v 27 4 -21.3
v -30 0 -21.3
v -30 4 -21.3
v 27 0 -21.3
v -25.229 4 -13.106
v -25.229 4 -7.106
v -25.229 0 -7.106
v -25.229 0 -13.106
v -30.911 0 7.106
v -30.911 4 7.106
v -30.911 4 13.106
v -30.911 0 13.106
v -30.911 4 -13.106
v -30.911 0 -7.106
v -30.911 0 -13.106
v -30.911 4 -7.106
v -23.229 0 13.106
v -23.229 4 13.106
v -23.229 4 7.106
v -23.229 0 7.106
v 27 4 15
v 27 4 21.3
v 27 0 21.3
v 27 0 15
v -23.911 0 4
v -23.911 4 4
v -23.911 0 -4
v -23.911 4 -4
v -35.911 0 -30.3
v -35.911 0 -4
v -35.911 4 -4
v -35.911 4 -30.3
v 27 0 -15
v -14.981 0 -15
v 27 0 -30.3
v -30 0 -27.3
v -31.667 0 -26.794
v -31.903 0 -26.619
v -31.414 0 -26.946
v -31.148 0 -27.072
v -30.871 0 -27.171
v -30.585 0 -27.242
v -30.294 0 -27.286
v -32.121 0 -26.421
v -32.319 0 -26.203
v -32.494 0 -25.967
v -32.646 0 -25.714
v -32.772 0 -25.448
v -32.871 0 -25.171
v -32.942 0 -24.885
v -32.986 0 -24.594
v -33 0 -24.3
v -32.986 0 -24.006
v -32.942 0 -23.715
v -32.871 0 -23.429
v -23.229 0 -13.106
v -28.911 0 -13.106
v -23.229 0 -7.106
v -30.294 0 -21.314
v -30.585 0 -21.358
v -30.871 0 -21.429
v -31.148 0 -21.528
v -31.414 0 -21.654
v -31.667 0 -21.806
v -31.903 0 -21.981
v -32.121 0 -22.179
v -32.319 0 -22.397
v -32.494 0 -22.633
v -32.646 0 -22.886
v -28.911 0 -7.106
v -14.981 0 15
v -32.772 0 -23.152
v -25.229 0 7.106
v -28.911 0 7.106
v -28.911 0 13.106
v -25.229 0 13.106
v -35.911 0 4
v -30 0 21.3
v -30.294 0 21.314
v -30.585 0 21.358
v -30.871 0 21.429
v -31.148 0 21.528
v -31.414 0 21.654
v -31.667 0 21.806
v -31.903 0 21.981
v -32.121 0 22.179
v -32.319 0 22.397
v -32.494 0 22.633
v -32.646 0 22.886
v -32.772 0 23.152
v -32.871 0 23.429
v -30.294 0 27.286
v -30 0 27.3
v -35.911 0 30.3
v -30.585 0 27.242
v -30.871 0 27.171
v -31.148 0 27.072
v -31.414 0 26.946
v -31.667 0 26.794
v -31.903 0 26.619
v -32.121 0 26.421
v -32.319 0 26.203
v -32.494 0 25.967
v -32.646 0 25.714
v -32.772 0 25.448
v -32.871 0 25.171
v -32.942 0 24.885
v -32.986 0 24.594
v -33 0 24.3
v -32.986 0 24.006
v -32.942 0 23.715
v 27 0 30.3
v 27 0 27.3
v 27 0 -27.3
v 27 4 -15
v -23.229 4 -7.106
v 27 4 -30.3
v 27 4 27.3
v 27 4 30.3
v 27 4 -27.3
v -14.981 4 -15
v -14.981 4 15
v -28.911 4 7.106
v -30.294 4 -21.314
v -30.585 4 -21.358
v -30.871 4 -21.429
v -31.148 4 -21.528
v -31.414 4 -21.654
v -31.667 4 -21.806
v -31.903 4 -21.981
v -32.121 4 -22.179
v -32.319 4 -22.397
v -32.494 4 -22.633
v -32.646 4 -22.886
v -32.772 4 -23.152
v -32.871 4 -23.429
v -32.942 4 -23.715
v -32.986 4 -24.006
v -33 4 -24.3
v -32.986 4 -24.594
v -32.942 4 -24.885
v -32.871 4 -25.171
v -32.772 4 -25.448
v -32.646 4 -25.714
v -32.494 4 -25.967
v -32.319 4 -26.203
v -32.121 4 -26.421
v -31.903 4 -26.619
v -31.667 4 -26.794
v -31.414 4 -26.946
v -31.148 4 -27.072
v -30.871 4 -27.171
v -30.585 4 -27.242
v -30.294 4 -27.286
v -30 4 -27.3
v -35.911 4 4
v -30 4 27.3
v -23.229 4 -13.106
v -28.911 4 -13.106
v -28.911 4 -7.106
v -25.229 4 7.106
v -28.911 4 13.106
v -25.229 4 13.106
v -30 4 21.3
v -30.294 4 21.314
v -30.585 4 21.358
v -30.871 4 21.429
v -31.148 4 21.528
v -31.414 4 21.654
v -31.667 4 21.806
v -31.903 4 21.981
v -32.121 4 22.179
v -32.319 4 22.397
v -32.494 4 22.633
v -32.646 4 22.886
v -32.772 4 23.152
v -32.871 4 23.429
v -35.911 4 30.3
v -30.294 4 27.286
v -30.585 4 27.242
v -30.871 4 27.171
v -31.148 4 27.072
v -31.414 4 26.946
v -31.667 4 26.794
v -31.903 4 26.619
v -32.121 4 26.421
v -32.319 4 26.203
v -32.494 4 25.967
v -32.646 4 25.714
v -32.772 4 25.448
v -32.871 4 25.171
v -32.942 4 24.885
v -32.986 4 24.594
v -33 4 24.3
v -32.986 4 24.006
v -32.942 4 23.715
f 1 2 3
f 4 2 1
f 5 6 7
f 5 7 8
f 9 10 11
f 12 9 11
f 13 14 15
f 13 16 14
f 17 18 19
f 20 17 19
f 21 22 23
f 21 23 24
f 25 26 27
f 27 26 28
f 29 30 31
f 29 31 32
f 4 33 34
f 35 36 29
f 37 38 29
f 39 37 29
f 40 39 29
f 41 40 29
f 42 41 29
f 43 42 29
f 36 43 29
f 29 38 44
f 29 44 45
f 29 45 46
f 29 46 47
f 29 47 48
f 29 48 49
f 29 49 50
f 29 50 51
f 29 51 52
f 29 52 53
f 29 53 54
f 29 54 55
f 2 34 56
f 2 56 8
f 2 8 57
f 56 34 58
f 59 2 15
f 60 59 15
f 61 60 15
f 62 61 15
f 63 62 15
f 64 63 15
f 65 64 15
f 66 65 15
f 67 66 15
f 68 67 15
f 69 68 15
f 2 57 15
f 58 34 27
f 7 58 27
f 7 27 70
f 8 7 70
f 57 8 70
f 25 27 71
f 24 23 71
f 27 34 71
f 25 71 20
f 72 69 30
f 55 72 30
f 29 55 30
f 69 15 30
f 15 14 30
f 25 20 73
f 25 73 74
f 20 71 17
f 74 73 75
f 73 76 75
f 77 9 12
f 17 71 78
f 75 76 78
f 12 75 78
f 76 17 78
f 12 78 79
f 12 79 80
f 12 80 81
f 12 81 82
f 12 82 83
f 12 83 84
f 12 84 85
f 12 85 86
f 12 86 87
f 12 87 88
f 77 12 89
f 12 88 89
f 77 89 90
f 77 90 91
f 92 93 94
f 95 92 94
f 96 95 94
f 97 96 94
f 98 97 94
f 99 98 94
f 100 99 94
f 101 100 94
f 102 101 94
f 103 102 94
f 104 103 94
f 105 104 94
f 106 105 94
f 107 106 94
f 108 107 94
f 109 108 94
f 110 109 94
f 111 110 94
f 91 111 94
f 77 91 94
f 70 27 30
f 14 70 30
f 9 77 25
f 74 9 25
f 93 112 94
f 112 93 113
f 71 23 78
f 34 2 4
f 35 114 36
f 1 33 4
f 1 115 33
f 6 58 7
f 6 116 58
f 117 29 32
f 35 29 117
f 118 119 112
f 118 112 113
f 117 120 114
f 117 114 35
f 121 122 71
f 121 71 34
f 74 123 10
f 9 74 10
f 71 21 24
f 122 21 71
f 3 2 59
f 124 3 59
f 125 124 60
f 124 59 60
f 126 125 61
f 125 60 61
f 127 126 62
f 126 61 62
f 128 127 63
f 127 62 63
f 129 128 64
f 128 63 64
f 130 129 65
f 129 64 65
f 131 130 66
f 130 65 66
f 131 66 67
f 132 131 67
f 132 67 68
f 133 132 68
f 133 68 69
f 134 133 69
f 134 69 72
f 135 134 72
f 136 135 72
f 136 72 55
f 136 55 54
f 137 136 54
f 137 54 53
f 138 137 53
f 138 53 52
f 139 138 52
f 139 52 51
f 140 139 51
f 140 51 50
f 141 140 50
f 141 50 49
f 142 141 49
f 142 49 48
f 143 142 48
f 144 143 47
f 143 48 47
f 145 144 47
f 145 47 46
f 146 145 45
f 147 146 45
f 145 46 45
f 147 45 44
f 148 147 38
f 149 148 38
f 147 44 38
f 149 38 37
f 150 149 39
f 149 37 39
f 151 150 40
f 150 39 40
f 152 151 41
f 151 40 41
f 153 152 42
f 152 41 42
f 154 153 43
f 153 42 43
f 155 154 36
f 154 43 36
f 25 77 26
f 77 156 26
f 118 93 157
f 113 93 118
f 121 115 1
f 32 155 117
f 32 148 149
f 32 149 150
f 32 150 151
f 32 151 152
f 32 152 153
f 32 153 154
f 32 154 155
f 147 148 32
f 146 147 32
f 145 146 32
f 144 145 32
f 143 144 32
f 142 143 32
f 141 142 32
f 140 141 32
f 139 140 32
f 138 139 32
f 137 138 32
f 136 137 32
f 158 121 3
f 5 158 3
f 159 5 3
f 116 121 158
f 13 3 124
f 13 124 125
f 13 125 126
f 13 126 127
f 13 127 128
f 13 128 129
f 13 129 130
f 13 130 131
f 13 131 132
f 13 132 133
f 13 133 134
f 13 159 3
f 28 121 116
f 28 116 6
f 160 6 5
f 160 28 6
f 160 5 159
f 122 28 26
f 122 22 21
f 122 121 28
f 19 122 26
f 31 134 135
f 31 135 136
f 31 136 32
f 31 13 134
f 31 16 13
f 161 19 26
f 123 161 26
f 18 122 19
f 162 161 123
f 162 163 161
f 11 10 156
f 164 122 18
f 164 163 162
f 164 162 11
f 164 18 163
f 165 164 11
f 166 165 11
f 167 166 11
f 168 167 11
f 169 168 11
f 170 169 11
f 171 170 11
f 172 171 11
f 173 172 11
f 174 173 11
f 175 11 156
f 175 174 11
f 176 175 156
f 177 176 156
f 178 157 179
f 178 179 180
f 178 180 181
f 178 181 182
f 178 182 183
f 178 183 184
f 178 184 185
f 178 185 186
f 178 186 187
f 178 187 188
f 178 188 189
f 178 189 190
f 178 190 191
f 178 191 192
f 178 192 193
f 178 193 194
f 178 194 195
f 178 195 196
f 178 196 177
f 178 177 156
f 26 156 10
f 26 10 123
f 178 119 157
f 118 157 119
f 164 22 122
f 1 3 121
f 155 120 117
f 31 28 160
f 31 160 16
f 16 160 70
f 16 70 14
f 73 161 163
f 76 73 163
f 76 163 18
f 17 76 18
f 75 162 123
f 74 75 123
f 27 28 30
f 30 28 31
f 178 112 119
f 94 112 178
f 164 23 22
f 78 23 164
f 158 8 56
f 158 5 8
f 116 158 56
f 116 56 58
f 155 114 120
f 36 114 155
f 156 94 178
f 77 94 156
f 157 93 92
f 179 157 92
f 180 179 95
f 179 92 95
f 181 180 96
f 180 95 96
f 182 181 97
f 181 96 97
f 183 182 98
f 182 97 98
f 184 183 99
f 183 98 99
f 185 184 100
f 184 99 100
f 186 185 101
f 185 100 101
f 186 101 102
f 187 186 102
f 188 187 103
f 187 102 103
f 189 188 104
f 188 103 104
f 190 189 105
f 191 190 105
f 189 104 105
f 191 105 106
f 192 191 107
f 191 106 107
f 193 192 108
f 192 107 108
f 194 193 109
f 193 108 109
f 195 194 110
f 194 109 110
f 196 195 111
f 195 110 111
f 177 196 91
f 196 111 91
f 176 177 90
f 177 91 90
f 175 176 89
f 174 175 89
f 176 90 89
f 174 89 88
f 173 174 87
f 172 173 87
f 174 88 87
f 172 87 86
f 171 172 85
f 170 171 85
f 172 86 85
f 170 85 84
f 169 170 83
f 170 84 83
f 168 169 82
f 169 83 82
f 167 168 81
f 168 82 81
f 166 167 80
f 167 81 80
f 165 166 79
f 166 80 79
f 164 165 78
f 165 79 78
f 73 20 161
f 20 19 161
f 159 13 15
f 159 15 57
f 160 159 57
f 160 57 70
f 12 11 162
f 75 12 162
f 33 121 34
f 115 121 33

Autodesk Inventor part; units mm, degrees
ref_plane "YZ Plane" through (0, 0, 0) normal (1, 0, 0) x (0, 1, 0)
ref_plane "XZ Plane" through (0, 0, 0) normal (0, 1, 0) x (-1, 0, 0)
ref_plane "XY Plane" through (0, 0, 0) normal (0, 0, 1) x (1, 0, 0)
sketch "Эскиз1" plane through (0, 0, 0) normal (0, 1, 0) x (-1, 0, 0)
  line L0 (0, 0) -> (0, 24.3)
  line L1 (0, 0) -> (0, -24.3)
  line L2 (-30, 24.3) -> (30, 24.3) construction
  line L3 (-30, 21.3) -> (30, 21.3)
  line L4 (30, 27.3) -> (-30, 27.3)
  arc A0 (-30, 27.3) -> (-30, 21.3) centre (-30, 24.3) ccw
  arc A1 (30, 21.3) -> (30, 27.3) centre (30, 24.3) ccw
  line L5 (-30, -24.3) -> (30, -24.3) construction
  line L6 (-30, -27.3) -> (30, -27.3)
  line L7 (30, -21.3) -> (-30, -21.3)
  arc A2 (-30, -21.3) -> (-30, -27.3) centre (-30, -24.3) ccw
  arc A3 (30, -27.3) -> (30, -21.3) centre (30, -24.3) ccw
  line L8 (-33, 24.3) -> (-33, 30.3)
  line L9 (-33, 30.3) -> (35.9111, 30.3)
  line L10 (35.9111, 30.3) -> (35.9111, -30.3)
  line L11 (35.9111, -30.3) -> (-33, -30.3)
  line L12 (-33, -30.3) -> (-33, 30.3)
  dimension "d0" = 24.3
  dimension "d1" = 24.3
  dimension "d2" = 30
  dimension "d3" = 6
  dimension "d4" = 6
  dimension "d5" = 6
  dimension "d6" = 6
extrude "Выдавливание1" add sketch "Эскиз1" along normal blind 4 contours L1 L7 A2 L12 A0 L3 L0 | L0 L3 A1 L4 A0 L8 L9 L10 L11 L12 A2 L6 A3 L7 L1
sketch "Эскиз2" plane through (0, 4, 0) normal (0, 1, 0) x (1, 0, 0)
  line L0 (33, 30.3) -> (-35.9111, 30.3) projected
  line L1 (33, -30.3) -> (27, -30.3)
  line L2 (27, -30.3) -> (27, 30.3)
  line L3 (27, 30.3) -> (33, 30.3)
  line L4 (33, 30.3) -> (33, -30.3)
  point P0 (0, 0)
  dimension "d9" = 6
extrude "Выдавливание2" cut sketch "Эскиз2" against normal through all
sketch "Эскиз3" plane through (0, 4, 0) normal (0, 1, 0) x (1, 0, 0)
  line L0 (27, 21.3) -> (27, -21.3) projected
  line L1 (27, 0) -> (27, -15)
  line L2 (27, -15) -> (27, 15)
  line L3 (27, -15) -> (-4.4812, -15)
  line L4 (-4.4812, -15) -> (-4.4812, 15)
  line L5 (-4.4812, 15) -> (27, 15)
  line L6 (27, 15) -> (27, -15)
  point P0 (0, 0)
  dimension "d12" = 15
  dimension "d13" = 30
extrude "Выдавливание3" cut sketch "Эскиз3" against normal blind 4
move faces "Перенос1" translate (-10.5, 0, 0) faces at (-4.4812, 2.6667, -5) (-21.4937, 0, 5)
sketch "Эскиз5" plane through (0, 4, 0) normal (0, 1, 0) x (1, 0, 0)
  line L0 (-35.9111, 30.3) -> (-35.9111, -30.3) projected
  line L1 (27, -15) -> (-14.9812, -15) projected
  line L2 (-35.9111, 15.0973) -> (-14.9812, 15.0973)
  line L3 (-14.9812, 15.0973) -> (-14.9812, -15)
  line L4 (-14.9812, -15) -> (-35.9111, -15)
  line L5 (-35.9111, -15) -> (-35.9111, 15.0973)
  point P0 (0, 0)
extrude "Выдавливание5" [suppressed]
sketch "Эскиз6" plane through (-35.9111, 0, 30.3) normal (0, -1, 0) x (1, 0, 0)
  line L0 (0, -45.3973) -> (20.9298, -45.3973) projected
  line L1 (0, -45.3973) -> (0, -42.3973)
  line L2 (0, -45.3973) -> (0, -15.3) projected
  line L3 (0, -15.3) -> (0, -18.3)
  line L4 (0, -42.3973) -> (15.1843, -42.3973)
  line L5 (15.1843, -42.3973) -> (15.1843, -18.3)
  line L6 (15.1843, -18.3) -> (0, -18.3)
  line L7 (0, -18.3) -> (0, -42.3973)
  point P0 (35.9111, -30.3)
  dimension "d26" = 3
  dimension "d27" = 3
extrude "Выдавливание6" [suppressed]
chamfer "Фаска1" [suppressed]
sketch "Эскиз7" plane through (0, 4, 0) normal (0, 1, 0) x (1, 0, 0)
  line L0 (-30.9111, -13.106) -> (-28.9111, -13.106)
  line L1 (-28.9111, -13.106) -> (-28.9111, -7.106)
  line L2 (-28.9111, -7.106) -> (-30.9111, -7.106)
  line L3 (-30.9111, -7.106) -> (-30.9111, -13.106)
  line L4 (-25.2291, -13.106) -> (-23.2291, -13.106)
  line L5 (-23.2291, -13.106) -> (-23.2291, -7.106)
  line L6 (-23.2291, -7.106) -> (-25.2291, -7.106)
  line L7 (-25.2291, -7.106) -> (-25.2291, -13.106)
  line L8 (0, 0) -> (-7.2083, 0)
  line L9 (-35.9111, 30.3) -> (-35.9111, -30.3) projected
  line L10 (-30.9111, 13.106) -> (-28.9111, 13.106)
  line L11 (-28.9111, 13.106) -> (-28.9111, 7.106)
  line L12 (-28.9111, 7.106) -> (-30.9111, 7.106)
  line L13 (-30.9111, 7.106) -> (-30.9111, 13.106)
  line L14 (-25.2291, 13.106) -> (-23.2291, 13.106)
  line L15 (-23.2291, 13.106) -> (-23.2291, 7.106)
  line L16 (-23.2291, 7.106) -> (-25.2291, 7.106)
  line L17 (-25.2291, 7.106) -> (-25.2291, 13.106)
  dimension "d33" = 2
  dimension "d34" = 6
  dimension "d35" = 2
  dimension "d36" = 5
extrude "Выдавливание7" cut sketch "Эскиз7" against normal blind 10
sketch "Эскиз8" plane through (0, 4, 0) normal (0, 1, 0) x (1, 0, 0)
  line L0 (-35.9111, 30.3) -> (-35.9111, -30.3) projected
  line L1 (-35.9111, 0) -> (-35.9111, -4)
  line L2 (-35.9111, -4) -> (-25.9111, -4)
  line L3 (-35.9111, -4) -> (-23.9111, -4)
  line L4 (-23.9111, -4) -> (-23.9111, 4)
  line L5 (-23.9111, 4) -> (-35.9111, 4)
  line L6 (-35.9111, 4) -> (-35.9111, -4)
  point P0 (0, 0)
  dimension "d39" = 4
  dimension "d40" = 10
  dimension "d41" = 12
  dimension "d42" = 8
extrude "Выдавливание8" cut sketch "Эскиз8" against normal blind 10
properties part number "КВ33.044.204 - Держатель ремня"
